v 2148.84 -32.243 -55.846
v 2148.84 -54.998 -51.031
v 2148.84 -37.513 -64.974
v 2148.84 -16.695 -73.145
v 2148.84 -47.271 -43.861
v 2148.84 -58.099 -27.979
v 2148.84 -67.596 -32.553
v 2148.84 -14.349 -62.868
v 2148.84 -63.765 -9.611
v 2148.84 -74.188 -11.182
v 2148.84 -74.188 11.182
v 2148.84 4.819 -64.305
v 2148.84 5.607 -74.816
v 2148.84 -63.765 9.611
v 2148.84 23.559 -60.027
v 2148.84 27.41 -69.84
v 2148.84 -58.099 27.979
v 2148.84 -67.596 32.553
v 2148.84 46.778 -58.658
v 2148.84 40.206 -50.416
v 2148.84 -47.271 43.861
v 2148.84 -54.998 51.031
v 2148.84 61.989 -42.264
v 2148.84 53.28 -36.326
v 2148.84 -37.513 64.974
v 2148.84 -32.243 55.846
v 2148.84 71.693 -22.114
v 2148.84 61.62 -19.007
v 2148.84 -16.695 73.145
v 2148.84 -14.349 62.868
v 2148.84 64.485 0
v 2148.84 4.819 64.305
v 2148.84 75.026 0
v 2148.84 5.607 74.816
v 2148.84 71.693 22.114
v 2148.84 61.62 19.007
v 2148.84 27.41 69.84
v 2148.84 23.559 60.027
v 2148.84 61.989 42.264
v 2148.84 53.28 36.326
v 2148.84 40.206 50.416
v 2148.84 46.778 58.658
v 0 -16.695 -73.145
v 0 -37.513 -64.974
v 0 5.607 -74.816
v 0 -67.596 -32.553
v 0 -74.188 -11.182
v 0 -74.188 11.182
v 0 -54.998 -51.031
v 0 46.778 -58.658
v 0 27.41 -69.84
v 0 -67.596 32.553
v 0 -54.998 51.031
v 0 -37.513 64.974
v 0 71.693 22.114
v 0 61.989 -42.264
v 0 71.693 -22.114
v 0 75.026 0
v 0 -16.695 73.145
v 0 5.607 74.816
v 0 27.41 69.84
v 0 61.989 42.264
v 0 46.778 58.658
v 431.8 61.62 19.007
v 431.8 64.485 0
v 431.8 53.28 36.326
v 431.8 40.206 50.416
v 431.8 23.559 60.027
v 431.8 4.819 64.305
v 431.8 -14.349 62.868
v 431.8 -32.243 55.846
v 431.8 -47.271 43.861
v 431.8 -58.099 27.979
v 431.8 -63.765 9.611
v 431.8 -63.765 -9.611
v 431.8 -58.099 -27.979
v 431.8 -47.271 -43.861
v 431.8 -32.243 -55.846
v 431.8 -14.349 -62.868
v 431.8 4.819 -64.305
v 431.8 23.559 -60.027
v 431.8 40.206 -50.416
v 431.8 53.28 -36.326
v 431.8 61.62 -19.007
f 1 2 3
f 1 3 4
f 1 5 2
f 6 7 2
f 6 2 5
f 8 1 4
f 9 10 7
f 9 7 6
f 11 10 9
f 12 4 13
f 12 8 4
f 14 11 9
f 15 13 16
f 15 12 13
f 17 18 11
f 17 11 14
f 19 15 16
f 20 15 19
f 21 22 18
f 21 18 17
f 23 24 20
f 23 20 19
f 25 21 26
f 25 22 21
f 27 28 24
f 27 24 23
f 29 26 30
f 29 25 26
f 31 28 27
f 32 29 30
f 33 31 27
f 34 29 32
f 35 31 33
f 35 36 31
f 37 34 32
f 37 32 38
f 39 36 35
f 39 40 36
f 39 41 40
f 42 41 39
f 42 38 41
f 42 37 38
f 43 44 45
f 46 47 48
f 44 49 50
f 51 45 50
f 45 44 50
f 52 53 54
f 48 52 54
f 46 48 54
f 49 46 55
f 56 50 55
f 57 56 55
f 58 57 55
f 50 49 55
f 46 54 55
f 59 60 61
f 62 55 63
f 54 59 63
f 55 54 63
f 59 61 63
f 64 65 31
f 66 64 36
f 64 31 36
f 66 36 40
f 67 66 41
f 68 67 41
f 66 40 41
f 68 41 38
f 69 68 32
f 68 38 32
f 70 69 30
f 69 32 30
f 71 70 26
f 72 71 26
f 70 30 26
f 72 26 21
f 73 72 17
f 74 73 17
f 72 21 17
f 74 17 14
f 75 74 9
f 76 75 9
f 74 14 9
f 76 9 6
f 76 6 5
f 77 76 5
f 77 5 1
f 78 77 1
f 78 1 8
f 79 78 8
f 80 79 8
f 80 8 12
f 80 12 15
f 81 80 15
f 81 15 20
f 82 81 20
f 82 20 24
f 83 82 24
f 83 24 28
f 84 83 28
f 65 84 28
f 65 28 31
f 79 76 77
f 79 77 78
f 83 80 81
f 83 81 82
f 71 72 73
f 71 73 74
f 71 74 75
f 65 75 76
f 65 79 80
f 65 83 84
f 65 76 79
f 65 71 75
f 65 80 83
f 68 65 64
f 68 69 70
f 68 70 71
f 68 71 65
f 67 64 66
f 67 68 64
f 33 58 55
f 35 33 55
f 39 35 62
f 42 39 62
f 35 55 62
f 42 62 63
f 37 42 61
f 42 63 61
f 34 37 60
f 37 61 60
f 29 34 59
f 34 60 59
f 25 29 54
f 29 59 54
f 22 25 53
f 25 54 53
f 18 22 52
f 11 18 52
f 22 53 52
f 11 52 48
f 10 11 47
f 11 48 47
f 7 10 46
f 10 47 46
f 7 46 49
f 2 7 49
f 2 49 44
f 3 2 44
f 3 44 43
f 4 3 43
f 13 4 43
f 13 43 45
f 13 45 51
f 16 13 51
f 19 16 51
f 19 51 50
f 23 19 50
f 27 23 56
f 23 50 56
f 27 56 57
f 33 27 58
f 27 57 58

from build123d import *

# Parameters (mm, degrees)
F0_R      = 75.025987
F1_DEPTH  = 2148.84
F2_R      = 64.485043
F3_DEPTH  = 203.2
F3_FACE_R = 64.485043
F4_DEPTH  = 1513.84


with BuildPart() as f1:
    # F0 (on Right) → F1 (new body)
    with BuildSketch(Plane.YZ):
        Circle(F0_R)
    extrude(amount=F1_DEPTH)

    # F2 (on face) → F3 (cut)
    with BuildSketch(Plane.YZ.offset(2148.84)):
        Circle(F2_R)
    extrude(amount=-F3_DEPTH, mode=Mode.SUBTRACT)

    # F3_face (on face) → F4 (cut)
    with BuildSketch(Plane.YZ.offset(1945.64)):
        Circle(F3_FACE_R)
    extrude(amount=-F4_DEPTH, mode=Mode.SUBTRACT)


solid = f1.part
